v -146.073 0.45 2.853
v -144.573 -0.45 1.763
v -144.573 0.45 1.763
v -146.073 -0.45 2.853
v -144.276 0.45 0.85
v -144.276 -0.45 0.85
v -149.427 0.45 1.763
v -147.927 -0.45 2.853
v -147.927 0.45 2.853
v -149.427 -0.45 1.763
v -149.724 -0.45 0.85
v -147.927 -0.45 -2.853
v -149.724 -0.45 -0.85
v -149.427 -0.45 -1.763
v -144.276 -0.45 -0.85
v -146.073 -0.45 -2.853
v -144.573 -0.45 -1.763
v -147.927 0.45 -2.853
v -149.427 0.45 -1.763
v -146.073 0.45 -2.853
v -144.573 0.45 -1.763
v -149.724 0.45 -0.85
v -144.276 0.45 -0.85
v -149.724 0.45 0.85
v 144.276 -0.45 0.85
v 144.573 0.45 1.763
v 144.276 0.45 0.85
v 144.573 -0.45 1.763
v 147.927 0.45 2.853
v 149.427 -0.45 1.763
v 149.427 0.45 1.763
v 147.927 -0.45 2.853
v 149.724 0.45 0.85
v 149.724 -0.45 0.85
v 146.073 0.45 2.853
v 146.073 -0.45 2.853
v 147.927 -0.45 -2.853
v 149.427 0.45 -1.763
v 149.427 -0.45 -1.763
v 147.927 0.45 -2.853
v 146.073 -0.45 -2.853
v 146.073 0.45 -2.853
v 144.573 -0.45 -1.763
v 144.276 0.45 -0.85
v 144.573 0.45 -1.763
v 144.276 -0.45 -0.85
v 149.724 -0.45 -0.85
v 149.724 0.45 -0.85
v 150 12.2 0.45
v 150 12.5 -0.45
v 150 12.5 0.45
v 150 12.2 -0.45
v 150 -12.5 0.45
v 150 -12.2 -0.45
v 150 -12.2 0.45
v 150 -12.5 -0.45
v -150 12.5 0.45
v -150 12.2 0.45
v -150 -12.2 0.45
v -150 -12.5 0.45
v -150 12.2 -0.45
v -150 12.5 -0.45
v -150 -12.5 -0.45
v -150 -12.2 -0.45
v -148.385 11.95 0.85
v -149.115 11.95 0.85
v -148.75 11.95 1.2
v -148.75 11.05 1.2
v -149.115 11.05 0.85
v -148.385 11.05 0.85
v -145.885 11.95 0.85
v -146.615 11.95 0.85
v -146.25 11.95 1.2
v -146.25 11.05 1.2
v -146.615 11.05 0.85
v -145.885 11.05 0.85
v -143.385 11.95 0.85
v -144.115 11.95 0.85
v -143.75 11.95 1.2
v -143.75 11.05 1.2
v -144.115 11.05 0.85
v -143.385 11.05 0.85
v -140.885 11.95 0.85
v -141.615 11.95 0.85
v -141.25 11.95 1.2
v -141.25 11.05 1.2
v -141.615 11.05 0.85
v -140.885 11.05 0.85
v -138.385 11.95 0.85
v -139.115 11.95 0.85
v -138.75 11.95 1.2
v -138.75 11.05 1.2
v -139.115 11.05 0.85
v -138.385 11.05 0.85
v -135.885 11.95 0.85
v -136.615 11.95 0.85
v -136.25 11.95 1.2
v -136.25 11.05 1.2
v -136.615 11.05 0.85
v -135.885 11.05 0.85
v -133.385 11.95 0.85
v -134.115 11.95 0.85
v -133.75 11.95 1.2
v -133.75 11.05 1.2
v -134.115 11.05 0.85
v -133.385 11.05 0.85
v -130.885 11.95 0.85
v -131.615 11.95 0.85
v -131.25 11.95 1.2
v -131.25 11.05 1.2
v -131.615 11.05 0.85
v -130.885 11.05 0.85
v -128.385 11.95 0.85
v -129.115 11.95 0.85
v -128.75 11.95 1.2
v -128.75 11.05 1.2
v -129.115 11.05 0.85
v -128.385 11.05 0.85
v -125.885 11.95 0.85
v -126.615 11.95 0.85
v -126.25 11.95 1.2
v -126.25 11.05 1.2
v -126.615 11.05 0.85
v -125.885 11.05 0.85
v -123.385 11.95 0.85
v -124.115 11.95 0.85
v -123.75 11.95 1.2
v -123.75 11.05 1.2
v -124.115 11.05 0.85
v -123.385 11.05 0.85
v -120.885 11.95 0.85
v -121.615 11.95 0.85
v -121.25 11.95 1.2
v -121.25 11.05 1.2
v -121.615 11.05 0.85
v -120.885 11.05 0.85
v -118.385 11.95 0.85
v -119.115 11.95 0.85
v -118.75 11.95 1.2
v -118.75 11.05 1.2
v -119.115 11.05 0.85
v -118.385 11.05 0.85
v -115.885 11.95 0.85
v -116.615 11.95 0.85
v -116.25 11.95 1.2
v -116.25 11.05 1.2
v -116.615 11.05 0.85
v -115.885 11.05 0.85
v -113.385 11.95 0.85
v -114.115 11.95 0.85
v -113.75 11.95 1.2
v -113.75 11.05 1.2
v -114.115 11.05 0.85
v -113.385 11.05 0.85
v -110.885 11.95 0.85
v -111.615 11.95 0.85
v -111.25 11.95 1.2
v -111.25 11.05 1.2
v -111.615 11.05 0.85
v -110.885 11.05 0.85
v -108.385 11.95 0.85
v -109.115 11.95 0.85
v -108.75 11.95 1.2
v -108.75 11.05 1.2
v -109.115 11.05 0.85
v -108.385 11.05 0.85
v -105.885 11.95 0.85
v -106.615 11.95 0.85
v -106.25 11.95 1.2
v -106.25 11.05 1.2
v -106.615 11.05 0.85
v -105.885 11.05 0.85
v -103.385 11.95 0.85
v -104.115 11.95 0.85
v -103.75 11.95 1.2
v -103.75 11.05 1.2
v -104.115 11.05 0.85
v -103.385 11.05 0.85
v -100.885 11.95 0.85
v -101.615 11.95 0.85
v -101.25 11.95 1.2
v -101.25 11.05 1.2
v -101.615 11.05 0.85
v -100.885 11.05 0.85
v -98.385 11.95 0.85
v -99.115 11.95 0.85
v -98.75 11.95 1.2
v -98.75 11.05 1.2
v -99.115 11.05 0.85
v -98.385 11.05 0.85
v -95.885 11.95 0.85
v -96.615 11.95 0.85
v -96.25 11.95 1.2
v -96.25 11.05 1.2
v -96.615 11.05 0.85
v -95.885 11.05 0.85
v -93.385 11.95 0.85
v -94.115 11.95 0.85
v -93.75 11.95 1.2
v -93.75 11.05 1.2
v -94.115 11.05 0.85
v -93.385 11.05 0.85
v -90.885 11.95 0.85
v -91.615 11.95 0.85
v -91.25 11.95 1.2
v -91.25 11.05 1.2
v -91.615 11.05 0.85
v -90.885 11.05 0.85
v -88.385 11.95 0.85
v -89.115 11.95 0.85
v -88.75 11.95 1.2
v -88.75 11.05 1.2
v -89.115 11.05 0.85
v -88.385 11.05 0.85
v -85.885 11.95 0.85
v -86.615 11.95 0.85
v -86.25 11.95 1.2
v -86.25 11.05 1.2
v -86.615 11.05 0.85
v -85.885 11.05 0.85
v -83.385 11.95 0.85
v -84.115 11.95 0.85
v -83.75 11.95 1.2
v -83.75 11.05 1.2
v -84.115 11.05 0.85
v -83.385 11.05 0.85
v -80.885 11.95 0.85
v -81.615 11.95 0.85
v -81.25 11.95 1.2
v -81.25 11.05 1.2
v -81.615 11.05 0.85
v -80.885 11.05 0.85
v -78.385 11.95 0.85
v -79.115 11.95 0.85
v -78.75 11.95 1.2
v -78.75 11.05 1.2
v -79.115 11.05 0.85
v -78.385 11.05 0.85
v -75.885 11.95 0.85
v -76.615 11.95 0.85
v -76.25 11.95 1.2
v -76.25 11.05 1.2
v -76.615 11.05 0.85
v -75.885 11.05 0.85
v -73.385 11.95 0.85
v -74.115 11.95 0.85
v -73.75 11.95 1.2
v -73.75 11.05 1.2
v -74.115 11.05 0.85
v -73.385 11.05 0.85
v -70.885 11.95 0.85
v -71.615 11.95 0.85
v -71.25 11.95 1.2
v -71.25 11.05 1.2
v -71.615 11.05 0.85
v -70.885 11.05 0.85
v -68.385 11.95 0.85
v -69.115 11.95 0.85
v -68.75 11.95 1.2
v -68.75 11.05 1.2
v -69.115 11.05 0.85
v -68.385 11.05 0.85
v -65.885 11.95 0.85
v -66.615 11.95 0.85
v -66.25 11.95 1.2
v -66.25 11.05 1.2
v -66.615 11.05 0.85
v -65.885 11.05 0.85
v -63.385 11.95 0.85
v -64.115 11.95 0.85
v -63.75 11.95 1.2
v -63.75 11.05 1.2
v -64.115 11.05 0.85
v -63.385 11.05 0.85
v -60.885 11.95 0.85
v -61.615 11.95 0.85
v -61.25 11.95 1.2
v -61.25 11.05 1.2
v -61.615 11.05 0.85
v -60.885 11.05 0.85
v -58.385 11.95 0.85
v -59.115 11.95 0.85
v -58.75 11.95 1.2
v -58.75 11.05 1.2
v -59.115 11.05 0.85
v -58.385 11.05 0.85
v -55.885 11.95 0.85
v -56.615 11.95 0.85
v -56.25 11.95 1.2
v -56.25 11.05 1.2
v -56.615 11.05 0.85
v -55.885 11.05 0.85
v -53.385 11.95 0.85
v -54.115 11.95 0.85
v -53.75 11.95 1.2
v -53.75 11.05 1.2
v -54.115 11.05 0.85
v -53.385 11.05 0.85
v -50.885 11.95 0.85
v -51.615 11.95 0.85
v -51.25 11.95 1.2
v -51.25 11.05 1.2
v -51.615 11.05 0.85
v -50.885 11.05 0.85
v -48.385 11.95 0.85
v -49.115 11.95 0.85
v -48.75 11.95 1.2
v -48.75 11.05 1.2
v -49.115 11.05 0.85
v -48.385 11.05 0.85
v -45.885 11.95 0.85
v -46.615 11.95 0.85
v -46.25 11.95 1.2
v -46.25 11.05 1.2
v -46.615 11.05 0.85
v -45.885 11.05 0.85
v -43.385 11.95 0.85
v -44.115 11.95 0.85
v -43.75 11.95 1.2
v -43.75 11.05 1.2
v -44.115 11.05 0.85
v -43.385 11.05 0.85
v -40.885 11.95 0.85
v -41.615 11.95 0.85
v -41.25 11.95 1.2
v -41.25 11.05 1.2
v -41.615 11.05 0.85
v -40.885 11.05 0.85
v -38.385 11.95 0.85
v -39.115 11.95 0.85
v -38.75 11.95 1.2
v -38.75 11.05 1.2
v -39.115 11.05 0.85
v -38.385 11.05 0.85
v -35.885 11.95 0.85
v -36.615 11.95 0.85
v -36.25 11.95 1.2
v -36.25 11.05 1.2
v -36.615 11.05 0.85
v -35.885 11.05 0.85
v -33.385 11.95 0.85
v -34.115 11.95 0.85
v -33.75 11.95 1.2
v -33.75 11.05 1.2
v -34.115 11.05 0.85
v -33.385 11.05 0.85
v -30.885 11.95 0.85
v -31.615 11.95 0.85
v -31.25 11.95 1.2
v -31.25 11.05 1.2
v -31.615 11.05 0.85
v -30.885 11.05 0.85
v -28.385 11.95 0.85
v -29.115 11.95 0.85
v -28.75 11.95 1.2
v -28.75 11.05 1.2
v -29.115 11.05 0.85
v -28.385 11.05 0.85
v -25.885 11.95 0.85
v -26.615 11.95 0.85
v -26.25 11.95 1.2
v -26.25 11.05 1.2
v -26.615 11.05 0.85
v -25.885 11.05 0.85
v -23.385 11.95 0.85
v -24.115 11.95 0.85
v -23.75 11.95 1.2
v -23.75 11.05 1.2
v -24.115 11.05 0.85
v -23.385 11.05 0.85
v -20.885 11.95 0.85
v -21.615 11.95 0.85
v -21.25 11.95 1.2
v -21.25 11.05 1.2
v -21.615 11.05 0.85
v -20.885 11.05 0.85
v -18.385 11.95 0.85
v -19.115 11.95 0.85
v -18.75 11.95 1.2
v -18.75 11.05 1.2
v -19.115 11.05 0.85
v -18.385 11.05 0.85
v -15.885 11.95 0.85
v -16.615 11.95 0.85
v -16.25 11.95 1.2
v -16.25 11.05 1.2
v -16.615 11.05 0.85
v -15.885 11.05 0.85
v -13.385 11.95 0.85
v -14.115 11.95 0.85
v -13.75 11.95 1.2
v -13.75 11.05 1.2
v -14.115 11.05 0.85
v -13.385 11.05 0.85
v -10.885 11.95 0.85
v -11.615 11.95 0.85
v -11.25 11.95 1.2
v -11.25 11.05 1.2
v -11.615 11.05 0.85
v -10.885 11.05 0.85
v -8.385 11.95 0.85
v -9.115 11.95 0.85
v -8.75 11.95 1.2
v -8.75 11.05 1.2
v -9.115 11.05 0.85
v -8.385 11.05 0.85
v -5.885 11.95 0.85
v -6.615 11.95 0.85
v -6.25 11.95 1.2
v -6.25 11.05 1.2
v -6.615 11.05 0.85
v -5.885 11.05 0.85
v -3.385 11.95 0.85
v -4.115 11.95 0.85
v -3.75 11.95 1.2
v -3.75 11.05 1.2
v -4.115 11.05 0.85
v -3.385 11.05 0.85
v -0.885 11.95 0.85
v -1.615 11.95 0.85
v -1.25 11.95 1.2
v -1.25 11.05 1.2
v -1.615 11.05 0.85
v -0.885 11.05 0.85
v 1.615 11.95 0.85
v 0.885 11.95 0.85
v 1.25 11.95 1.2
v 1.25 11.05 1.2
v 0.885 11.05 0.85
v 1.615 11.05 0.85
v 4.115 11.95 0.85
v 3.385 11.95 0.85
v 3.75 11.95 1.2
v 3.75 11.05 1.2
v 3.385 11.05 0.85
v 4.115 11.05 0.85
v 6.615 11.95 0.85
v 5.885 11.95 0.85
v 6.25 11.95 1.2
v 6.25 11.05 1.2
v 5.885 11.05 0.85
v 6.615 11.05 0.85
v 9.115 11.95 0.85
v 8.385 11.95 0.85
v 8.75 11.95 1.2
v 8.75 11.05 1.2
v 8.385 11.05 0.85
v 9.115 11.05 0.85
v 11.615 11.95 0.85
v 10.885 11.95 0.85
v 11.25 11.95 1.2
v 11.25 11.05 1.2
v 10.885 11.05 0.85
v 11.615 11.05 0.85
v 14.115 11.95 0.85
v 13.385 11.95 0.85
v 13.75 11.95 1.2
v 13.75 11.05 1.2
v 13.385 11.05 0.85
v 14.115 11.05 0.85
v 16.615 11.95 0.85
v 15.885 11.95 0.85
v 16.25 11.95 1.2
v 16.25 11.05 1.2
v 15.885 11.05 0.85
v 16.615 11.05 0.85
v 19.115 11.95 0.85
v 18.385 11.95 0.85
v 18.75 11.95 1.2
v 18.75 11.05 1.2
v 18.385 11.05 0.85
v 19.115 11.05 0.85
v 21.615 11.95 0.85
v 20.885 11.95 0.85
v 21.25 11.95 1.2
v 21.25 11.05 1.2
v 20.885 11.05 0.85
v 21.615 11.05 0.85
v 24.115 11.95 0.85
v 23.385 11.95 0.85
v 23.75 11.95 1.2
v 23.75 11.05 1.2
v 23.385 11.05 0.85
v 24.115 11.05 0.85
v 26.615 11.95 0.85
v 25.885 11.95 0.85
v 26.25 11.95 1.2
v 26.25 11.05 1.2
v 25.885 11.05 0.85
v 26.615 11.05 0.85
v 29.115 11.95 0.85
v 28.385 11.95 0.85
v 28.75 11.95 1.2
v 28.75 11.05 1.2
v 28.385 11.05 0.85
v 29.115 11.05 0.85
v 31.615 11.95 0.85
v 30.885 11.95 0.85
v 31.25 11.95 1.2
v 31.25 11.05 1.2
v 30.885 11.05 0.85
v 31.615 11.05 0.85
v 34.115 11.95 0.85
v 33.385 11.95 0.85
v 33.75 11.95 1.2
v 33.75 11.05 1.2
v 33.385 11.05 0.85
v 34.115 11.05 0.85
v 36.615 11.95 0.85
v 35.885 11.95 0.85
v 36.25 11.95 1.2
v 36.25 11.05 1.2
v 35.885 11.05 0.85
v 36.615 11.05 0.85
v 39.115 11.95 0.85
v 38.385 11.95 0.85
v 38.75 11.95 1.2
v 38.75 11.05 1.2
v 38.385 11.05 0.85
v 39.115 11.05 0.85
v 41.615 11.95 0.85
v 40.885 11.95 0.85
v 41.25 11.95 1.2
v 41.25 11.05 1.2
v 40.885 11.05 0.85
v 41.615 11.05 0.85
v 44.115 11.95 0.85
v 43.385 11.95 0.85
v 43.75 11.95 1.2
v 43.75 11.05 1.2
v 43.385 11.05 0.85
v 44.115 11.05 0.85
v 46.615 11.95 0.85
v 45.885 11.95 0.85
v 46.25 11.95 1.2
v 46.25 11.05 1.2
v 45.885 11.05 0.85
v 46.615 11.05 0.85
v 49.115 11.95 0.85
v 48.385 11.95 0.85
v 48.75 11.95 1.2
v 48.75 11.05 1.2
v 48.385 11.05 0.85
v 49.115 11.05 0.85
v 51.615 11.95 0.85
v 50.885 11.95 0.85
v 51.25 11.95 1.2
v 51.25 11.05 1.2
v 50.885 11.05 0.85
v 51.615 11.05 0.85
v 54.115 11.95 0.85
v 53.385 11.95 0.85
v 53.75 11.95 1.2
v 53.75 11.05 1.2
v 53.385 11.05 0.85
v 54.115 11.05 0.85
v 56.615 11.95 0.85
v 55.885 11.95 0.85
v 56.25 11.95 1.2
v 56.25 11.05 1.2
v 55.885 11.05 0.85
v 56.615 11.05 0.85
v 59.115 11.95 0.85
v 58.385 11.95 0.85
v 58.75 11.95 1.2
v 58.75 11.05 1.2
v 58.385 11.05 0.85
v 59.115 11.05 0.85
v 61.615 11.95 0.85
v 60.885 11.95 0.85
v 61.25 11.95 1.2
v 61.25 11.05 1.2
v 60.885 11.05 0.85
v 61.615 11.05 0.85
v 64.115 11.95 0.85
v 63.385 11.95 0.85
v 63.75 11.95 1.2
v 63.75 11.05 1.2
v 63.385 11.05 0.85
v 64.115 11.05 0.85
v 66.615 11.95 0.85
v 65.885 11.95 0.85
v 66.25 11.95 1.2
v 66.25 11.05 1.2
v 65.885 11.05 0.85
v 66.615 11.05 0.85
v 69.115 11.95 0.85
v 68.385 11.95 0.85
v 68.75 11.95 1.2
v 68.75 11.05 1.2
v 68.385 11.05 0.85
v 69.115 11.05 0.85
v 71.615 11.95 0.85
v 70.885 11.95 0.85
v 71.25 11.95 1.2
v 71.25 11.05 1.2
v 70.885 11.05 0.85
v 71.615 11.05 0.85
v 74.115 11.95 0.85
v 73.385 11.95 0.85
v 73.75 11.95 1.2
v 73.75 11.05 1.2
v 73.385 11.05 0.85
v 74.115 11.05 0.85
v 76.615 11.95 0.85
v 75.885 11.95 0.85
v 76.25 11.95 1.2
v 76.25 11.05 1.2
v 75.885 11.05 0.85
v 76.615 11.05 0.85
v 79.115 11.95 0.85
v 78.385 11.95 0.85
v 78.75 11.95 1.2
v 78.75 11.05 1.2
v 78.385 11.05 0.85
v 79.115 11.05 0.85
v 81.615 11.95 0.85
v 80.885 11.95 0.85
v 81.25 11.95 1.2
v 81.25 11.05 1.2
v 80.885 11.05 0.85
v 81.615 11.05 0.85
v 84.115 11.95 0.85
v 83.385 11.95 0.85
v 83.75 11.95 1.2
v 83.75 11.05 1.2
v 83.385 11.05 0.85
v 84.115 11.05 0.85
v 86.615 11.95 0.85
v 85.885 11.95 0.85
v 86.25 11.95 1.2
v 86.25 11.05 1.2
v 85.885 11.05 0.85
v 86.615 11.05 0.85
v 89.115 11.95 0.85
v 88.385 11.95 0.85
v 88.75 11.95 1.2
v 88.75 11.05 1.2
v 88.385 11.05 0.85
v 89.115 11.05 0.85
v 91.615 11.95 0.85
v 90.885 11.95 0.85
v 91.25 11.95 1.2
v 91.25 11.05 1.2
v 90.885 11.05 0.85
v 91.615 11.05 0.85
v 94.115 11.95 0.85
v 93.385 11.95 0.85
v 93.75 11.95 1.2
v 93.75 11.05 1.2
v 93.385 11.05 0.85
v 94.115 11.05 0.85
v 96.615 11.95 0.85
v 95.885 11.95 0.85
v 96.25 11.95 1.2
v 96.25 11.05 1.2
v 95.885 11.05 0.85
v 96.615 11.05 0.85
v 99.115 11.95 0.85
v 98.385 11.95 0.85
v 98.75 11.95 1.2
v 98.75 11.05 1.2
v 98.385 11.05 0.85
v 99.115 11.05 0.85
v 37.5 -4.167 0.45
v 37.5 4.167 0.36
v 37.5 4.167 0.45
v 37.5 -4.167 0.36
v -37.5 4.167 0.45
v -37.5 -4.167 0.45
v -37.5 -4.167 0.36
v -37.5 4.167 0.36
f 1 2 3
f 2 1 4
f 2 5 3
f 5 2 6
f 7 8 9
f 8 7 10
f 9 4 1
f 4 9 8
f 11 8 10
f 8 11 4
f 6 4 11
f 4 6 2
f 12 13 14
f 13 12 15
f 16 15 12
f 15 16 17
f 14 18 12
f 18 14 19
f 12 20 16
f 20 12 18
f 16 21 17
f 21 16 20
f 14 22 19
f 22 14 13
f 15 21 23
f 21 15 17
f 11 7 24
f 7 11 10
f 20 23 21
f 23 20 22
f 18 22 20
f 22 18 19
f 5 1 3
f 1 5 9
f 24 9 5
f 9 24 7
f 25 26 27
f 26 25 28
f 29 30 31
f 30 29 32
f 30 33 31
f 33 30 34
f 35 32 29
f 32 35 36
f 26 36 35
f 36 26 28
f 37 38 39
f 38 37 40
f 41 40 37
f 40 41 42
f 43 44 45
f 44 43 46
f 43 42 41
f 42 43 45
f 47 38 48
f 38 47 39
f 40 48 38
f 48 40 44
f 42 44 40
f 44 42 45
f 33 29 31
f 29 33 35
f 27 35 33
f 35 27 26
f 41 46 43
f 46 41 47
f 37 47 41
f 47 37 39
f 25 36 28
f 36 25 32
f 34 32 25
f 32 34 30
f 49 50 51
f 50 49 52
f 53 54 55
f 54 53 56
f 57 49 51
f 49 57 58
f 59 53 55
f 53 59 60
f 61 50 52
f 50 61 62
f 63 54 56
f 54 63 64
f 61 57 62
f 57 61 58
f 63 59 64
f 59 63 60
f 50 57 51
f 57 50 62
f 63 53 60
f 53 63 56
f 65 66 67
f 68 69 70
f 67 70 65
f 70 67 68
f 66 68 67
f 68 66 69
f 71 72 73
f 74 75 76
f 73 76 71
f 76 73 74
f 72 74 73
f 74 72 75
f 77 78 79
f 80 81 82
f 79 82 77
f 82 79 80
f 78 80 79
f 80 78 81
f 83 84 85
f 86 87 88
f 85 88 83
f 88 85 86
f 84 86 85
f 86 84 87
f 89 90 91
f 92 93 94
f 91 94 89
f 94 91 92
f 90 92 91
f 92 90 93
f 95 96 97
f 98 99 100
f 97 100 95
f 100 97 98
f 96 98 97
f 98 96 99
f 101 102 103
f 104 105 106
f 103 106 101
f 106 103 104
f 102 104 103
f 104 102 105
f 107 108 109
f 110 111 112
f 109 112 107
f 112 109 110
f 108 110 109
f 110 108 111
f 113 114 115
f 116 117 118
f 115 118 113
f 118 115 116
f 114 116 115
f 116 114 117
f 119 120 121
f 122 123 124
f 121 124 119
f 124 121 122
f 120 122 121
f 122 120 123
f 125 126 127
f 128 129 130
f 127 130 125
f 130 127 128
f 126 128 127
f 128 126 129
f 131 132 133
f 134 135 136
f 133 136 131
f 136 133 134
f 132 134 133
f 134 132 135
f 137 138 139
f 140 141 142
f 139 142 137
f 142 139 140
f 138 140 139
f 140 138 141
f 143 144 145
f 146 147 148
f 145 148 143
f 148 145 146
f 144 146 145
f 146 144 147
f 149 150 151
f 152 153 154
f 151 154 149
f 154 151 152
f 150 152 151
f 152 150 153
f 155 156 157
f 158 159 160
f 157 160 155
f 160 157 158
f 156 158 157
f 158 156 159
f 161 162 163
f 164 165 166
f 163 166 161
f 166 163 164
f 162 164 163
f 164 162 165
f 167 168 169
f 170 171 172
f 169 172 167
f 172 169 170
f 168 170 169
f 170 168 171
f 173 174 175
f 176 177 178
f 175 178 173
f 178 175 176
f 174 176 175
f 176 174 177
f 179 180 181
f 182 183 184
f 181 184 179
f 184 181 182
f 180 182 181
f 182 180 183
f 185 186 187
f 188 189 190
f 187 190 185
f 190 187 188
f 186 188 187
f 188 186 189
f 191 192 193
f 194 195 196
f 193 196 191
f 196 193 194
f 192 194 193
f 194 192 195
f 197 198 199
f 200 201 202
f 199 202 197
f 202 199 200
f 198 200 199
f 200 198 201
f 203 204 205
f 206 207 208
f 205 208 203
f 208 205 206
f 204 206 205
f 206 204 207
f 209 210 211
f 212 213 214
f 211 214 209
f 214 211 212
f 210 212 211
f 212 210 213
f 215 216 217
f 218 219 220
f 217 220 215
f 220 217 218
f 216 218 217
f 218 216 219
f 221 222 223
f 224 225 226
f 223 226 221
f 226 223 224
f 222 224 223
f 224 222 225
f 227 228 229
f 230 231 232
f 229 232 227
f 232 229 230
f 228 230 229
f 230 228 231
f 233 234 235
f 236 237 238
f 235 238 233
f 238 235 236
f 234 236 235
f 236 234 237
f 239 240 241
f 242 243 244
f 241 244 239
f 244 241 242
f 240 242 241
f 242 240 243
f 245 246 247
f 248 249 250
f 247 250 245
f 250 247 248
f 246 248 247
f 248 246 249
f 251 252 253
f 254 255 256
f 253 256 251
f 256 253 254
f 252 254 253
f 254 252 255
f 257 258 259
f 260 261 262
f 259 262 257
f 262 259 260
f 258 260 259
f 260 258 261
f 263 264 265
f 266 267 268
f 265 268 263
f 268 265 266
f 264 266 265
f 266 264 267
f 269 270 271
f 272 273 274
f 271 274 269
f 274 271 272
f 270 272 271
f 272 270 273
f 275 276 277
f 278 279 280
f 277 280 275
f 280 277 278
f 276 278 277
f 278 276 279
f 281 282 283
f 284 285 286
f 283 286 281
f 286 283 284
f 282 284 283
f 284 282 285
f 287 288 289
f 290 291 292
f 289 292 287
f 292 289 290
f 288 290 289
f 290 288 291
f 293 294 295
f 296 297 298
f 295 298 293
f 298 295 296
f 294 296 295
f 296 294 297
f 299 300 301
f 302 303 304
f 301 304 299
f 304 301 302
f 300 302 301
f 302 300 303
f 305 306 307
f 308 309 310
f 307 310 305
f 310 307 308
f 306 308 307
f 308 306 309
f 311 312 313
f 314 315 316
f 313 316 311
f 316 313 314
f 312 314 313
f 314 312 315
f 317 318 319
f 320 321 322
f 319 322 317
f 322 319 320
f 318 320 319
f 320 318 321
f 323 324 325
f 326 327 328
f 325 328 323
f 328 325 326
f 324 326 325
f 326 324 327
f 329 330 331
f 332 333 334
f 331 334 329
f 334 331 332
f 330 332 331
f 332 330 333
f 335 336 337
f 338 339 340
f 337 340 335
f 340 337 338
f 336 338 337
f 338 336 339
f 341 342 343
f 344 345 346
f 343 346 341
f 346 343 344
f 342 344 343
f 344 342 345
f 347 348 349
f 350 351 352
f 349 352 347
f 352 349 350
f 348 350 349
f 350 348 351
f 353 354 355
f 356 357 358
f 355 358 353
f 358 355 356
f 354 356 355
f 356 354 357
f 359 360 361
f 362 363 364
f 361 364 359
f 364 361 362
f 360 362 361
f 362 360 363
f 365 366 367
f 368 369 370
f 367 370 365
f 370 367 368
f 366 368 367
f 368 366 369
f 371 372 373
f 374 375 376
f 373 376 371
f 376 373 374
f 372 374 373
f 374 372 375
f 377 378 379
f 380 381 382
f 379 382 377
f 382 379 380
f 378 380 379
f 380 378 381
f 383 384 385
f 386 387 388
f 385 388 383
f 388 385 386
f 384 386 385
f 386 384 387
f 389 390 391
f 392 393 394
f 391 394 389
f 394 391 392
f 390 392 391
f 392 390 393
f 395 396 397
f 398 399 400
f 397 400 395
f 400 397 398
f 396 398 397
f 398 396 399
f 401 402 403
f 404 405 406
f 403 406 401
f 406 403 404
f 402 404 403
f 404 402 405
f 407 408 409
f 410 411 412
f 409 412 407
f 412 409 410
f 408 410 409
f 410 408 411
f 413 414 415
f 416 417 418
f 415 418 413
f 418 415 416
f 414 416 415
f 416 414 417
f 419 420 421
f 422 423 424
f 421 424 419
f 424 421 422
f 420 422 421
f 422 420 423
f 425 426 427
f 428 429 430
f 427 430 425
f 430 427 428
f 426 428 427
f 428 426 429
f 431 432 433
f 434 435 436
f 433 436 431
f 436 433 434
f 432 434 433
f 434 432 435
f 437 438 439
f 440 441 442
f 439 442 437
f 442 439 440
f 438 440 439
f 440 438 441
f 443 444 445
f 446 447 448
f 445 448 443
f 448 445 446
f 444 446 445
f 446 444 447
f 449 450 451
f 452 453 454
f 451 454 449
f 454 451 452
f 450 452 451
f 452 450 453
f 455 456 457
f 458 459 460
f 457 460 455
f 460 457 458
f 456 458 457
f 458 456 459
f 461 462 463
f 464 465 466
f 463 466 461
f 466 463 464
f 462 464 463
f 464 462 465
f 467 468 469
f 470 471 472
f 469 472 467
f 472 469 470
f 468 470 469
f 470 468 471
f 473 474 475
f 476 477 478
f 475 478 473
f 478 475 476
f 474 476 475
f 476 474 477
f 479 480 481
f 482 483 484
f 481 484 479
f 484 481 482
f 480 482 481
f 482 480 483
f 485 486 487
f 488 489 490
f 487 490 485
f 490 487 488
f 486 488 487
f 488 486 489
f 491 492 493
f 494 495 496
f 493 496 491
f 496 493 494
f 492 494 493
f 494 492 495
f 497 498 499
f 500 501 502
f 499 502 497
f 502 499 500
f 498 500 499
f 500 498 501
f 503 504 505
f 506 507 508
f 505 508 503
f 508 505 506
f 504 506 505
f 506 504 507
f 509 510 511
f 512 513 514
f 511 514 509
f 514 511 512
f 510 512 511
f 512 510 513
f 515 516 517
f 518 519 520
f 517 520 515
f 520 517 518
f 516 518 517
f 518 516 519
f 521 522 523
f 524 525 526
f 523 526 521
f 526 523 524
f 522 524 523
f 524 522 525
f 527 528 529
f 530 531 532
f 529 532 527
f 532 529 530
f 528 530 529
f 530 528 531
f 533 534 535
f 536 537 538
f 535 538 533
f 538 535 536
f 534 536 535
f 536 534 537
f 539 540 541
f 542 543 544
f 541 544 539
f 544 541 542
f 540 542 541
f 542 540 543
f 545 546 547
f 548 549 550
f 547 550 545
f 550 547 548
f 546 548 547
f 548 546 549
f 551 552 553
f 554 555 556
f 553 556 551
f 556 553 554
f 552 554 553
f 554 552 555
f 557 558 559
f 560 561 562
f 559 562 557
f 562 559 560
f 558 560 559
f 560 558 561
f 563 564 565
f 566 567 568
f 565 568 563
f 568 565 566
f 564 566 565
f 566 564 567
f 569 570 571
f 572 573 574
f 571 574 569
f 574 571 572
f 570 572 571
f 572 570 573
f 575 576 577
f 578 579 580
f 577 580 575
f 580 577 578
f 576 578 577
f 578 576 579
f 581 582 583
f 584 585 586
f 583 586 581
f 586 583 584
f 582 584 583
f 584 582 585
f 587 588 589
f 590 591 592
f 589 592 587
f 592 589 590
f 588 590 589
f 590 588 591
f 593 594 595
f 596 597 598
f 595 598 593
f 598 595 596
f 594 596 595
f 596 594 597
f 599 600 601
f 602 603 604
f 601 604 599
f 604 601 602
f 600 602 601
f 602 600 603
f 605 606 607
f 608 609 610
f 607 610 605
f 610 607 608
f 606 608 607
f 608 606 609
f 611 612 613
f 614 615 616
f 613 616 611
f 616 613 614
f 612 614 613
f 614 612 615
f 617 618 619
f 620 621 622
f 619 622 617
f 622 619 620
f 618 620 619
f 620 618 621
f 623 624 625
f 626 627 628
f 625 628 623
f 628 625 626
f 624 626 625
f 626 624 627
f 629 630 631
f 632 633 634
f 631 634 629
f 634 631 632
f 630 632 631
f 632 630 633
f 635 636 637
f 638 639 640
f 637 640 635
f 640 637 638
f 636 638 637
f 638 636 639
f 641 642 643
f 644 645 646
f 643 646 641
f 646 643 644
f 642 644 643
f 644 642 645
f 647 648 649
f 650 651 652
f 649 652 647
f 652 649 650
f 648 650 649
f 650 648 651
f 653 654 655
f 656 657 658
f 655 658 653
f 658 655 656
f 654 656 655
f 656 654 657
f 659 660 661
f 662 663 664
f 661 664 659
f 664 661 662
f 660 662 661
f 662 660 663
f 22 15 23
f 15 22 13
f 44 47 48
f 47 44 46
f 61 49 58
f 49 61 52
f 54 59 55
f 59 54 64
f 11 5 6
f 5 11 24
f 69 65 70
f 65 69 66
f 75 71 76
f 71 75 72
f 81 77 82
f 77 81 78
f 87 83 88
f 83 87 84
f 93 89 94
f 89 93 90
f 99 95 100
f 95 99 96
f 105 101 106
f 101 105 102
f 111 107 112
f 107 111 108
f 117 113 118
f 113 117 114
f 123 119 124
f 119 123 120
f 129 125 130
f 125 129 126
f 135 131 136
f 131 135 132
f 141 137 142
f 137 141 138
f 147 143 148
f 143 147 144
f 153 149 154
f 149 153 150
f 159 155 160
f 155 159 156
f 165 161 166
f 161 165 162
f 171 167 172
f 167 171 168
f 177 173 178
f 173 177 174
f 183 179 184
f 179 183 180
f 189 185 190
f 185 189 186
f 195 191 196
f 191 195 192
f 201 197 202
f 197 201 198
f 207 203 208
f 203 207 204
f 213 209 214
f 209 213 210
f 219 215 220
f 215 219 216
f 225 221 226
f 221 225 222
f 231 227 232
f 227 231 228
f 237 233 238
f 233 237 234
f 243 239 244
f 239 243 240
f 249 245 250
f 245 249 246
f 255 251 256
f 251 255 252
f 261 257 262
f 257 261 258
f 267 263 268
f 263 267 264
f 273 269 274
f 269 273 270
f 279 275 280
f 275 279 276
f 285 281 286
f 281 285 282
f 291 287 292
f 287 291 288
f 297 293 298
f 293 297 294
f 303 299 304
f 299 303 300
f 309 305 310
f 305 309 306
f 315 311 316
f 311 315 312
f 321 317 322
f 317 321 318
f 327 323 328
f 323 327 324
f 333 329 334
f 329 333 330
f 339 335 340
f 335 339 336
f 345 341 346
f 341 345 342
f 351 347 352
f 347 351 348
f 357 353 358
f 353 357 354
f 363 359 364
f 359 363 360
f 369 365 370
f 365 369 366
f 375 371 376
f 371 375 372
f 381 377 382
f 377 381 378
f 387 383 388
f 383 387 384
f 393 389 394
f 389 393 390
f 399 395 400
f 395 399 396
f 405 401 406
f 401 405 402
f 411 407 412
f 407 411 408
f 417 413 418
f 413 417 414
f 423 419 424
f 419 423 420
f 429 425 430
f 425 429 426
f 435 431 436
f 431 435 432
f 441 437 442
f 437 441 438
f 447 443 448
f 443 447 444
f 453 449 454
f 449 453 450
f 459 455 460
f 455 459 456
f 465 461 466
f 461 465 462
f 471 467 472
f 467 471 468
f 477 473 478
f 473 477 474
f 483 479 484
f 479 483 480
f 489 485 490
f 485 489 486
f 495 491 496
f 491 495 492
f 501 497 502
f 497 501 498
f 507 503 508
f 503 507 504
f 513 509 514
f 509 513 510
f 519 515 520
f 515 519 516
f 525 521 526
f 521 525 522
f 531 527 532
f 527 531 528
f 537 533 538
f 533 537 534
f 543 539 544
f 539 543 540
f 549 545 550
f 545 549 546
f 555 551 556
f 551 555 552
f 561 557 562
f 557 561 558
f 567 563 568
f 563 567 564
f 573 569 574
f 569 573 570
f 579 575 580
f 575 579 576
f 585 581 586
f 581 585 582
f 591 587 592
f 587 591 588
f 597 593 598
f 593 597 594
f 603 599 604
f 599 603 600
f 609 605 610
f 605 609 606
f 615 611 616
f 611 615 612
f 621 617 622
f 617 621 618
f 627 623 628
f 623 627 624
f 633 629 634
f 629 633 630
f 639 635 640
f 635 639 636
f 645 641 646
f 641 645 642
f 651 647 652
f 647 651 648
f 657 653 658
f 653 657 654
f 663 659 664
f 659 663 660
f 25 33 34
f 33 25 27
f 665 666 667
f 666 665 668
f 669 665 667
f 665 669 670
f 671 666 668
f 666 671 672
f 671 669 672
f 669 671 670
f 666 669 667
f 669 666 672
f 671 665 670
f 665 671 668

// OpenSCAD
// Parameters
blade_L = 300; //[150:600:1]
blade_W = 25; //[12.5:50:1]
blade_T = 0.9; //[0.45:1.8:0.05]
tooth_pitch = 2.5; //[1.25:5:0.1]
tooth_H = 1.2; //[0.6:2.4:0.1]
tooth_tip_angle = 60; //[30:90:1]
tooth_set_offset = 0.2; //[0:0.6:0.05]
end_round_R = 3; //[1.5:6:0.5]
mount_hole_d = 6; //[3:12:0.5]
mount_hole_edge_margin = 10; //[5:20:1]
mount_hole_y_offset = 0; //[-5:5:0.5]
bimetal_step_depth = 0.15; //[0.05:0.4:0.05]
bimetal_band_W = 6; //[3:12:0.5]
edge_chamfer = 0.3; //[0:1:0.05]
fillet_R_visual = 1.0; //[0:3:0.25]
overlap = 1; //[0.5:2:0.1]

// Base Shapes
module blade_body_sheet() {
  cube([blade_L, blade_W, blade_T], center=true);
}

module blade_end_shape_left() {
  rotate([90, 0, 0])
    translate([-blade_L/2 + end_round_R, 0, 0])
      cylinder(r=end_round_R, h=blade_T, center=true);
}

module blade_end_shape_right() {
  rotate([90, 0, 0])
    translate([blade_L/2 - end_round_R, 0, 0])
      cylinder(r=end_round_R, h=blade_T, center=true);
}

module tooth_pattern_repeat() {
  linear_extrude(height=blade_T, center=true) {
    polygon(points=[
      [-tooth_pitch/2, 0],
      [0, tooth_H],
      [tooth_pitch/2, 0]
    ]);
  }
}

module mounting_hole_left() {
  translate([-blade_L/2 + mount_hole_edge_margin, mount_hole_y_offset, 0])
    cylinder(r=mount_hole_d/2, h=blade_T + 2*overlap, center=true);
}

module mounting_hole_right() {
  translate([blade_L/2 - mount_hole_edge_margin, mount_hole_y_offset, 0])
    cylinder(r=mount_hole_d/2, h=blade_T + 2*overlap, center=true);
}

module bi_metal_material_boundary_visual_step() {
  translate([0, blade_W/2 - bimetal_band_W/2, blade_T/2 - bimetal_step_depth/2])
    cube([blade_L, bimetal_band_W, bimetal_step_depth], center=true);
}

module edge_chamfers_top_cut() {
  translate([0, 0, blade_T/2 - (edge_chamfer + overlap)/2])
    cube([blade_L + 2*overlap, blade_W - 2*edge_chamfer, edge_chamfer + overlap], center=true);
}

module edge_chamfers_bottom_cut() {
  translate([0, 0, -blade_T/2 + (edge_chamfer + overlap)/2])
    cube([blade_L + 2*overlap, blade_W - 2*edge_chamfer, edge_chamfer + overlap], center=true);
}

module corner_fillets_visual_left() {
  rotate([90, 0, 0])
    translate([-blade_L/2 + fillet_R_visual, 0, 0])
      cylinder(r=fillet_R_visual, h=blade_T, center=true);
}

module corner_fillets_visual_right() {
  rotate([90, 0, 0])
    translate([blade_L/2 - fillet_R_visual, 0, 0])
      cylinder(r=fillet_R_visual, h=blade_T, center=true);
}

module brand_markings() {
  translate([0, 0, blade_T/2 - blade_T/20])
    cube([blade_L/4, blade_W/3, blade_T/10], center=true);
}

// Operations
module blade_end_shape() {
  union() {
    blade_end_shape_left();
    blade_end_shape_right();
  }
}

module corner_fillets() {
  union() {
    corner_fillets_visual_left();
    corner_fillets_visual_right();
  }
}

module blade_outline_union() {
  union() {
    blade_body_sheet();
    blade_end_shape();
    corner_fillets();
  }
}

module toothed_cutting_edge() {
  union() {
    for (i = [0:99]) {
      translate([-blade_L/2 + tooth_pitch/2 + i*tooth_pitch, blade_W/2 - overlap, 0])
        rotate([90, 0, 0])
          tooth_pattern_repeat();
    }
  }
}

module blade_with_teeth_and_step() {
  union() {
    blade_outline_union();
    toothed_cutting_edge();
    bi_metal_material_boundary_visual_step();
  }
}

module mounting_holes() {
  union() {
    mounting_hole_left();
    mounting_hole_right();
  }
}

module blade_minus_holes() {
  difference() {
    blade_with_teeth_and_step();
    mounting_holes();
  }
}

module edge_chamfers() {
  difference() {
    blade_minus_holes();
    edge_chamfers_top_cut();
    edge_chamfers_bottom_cut();
  }
}

module complete_model() {
  union() {
    edge_chamfers();
    brand_markings();
  }
}

// Final Output
complete_model();
